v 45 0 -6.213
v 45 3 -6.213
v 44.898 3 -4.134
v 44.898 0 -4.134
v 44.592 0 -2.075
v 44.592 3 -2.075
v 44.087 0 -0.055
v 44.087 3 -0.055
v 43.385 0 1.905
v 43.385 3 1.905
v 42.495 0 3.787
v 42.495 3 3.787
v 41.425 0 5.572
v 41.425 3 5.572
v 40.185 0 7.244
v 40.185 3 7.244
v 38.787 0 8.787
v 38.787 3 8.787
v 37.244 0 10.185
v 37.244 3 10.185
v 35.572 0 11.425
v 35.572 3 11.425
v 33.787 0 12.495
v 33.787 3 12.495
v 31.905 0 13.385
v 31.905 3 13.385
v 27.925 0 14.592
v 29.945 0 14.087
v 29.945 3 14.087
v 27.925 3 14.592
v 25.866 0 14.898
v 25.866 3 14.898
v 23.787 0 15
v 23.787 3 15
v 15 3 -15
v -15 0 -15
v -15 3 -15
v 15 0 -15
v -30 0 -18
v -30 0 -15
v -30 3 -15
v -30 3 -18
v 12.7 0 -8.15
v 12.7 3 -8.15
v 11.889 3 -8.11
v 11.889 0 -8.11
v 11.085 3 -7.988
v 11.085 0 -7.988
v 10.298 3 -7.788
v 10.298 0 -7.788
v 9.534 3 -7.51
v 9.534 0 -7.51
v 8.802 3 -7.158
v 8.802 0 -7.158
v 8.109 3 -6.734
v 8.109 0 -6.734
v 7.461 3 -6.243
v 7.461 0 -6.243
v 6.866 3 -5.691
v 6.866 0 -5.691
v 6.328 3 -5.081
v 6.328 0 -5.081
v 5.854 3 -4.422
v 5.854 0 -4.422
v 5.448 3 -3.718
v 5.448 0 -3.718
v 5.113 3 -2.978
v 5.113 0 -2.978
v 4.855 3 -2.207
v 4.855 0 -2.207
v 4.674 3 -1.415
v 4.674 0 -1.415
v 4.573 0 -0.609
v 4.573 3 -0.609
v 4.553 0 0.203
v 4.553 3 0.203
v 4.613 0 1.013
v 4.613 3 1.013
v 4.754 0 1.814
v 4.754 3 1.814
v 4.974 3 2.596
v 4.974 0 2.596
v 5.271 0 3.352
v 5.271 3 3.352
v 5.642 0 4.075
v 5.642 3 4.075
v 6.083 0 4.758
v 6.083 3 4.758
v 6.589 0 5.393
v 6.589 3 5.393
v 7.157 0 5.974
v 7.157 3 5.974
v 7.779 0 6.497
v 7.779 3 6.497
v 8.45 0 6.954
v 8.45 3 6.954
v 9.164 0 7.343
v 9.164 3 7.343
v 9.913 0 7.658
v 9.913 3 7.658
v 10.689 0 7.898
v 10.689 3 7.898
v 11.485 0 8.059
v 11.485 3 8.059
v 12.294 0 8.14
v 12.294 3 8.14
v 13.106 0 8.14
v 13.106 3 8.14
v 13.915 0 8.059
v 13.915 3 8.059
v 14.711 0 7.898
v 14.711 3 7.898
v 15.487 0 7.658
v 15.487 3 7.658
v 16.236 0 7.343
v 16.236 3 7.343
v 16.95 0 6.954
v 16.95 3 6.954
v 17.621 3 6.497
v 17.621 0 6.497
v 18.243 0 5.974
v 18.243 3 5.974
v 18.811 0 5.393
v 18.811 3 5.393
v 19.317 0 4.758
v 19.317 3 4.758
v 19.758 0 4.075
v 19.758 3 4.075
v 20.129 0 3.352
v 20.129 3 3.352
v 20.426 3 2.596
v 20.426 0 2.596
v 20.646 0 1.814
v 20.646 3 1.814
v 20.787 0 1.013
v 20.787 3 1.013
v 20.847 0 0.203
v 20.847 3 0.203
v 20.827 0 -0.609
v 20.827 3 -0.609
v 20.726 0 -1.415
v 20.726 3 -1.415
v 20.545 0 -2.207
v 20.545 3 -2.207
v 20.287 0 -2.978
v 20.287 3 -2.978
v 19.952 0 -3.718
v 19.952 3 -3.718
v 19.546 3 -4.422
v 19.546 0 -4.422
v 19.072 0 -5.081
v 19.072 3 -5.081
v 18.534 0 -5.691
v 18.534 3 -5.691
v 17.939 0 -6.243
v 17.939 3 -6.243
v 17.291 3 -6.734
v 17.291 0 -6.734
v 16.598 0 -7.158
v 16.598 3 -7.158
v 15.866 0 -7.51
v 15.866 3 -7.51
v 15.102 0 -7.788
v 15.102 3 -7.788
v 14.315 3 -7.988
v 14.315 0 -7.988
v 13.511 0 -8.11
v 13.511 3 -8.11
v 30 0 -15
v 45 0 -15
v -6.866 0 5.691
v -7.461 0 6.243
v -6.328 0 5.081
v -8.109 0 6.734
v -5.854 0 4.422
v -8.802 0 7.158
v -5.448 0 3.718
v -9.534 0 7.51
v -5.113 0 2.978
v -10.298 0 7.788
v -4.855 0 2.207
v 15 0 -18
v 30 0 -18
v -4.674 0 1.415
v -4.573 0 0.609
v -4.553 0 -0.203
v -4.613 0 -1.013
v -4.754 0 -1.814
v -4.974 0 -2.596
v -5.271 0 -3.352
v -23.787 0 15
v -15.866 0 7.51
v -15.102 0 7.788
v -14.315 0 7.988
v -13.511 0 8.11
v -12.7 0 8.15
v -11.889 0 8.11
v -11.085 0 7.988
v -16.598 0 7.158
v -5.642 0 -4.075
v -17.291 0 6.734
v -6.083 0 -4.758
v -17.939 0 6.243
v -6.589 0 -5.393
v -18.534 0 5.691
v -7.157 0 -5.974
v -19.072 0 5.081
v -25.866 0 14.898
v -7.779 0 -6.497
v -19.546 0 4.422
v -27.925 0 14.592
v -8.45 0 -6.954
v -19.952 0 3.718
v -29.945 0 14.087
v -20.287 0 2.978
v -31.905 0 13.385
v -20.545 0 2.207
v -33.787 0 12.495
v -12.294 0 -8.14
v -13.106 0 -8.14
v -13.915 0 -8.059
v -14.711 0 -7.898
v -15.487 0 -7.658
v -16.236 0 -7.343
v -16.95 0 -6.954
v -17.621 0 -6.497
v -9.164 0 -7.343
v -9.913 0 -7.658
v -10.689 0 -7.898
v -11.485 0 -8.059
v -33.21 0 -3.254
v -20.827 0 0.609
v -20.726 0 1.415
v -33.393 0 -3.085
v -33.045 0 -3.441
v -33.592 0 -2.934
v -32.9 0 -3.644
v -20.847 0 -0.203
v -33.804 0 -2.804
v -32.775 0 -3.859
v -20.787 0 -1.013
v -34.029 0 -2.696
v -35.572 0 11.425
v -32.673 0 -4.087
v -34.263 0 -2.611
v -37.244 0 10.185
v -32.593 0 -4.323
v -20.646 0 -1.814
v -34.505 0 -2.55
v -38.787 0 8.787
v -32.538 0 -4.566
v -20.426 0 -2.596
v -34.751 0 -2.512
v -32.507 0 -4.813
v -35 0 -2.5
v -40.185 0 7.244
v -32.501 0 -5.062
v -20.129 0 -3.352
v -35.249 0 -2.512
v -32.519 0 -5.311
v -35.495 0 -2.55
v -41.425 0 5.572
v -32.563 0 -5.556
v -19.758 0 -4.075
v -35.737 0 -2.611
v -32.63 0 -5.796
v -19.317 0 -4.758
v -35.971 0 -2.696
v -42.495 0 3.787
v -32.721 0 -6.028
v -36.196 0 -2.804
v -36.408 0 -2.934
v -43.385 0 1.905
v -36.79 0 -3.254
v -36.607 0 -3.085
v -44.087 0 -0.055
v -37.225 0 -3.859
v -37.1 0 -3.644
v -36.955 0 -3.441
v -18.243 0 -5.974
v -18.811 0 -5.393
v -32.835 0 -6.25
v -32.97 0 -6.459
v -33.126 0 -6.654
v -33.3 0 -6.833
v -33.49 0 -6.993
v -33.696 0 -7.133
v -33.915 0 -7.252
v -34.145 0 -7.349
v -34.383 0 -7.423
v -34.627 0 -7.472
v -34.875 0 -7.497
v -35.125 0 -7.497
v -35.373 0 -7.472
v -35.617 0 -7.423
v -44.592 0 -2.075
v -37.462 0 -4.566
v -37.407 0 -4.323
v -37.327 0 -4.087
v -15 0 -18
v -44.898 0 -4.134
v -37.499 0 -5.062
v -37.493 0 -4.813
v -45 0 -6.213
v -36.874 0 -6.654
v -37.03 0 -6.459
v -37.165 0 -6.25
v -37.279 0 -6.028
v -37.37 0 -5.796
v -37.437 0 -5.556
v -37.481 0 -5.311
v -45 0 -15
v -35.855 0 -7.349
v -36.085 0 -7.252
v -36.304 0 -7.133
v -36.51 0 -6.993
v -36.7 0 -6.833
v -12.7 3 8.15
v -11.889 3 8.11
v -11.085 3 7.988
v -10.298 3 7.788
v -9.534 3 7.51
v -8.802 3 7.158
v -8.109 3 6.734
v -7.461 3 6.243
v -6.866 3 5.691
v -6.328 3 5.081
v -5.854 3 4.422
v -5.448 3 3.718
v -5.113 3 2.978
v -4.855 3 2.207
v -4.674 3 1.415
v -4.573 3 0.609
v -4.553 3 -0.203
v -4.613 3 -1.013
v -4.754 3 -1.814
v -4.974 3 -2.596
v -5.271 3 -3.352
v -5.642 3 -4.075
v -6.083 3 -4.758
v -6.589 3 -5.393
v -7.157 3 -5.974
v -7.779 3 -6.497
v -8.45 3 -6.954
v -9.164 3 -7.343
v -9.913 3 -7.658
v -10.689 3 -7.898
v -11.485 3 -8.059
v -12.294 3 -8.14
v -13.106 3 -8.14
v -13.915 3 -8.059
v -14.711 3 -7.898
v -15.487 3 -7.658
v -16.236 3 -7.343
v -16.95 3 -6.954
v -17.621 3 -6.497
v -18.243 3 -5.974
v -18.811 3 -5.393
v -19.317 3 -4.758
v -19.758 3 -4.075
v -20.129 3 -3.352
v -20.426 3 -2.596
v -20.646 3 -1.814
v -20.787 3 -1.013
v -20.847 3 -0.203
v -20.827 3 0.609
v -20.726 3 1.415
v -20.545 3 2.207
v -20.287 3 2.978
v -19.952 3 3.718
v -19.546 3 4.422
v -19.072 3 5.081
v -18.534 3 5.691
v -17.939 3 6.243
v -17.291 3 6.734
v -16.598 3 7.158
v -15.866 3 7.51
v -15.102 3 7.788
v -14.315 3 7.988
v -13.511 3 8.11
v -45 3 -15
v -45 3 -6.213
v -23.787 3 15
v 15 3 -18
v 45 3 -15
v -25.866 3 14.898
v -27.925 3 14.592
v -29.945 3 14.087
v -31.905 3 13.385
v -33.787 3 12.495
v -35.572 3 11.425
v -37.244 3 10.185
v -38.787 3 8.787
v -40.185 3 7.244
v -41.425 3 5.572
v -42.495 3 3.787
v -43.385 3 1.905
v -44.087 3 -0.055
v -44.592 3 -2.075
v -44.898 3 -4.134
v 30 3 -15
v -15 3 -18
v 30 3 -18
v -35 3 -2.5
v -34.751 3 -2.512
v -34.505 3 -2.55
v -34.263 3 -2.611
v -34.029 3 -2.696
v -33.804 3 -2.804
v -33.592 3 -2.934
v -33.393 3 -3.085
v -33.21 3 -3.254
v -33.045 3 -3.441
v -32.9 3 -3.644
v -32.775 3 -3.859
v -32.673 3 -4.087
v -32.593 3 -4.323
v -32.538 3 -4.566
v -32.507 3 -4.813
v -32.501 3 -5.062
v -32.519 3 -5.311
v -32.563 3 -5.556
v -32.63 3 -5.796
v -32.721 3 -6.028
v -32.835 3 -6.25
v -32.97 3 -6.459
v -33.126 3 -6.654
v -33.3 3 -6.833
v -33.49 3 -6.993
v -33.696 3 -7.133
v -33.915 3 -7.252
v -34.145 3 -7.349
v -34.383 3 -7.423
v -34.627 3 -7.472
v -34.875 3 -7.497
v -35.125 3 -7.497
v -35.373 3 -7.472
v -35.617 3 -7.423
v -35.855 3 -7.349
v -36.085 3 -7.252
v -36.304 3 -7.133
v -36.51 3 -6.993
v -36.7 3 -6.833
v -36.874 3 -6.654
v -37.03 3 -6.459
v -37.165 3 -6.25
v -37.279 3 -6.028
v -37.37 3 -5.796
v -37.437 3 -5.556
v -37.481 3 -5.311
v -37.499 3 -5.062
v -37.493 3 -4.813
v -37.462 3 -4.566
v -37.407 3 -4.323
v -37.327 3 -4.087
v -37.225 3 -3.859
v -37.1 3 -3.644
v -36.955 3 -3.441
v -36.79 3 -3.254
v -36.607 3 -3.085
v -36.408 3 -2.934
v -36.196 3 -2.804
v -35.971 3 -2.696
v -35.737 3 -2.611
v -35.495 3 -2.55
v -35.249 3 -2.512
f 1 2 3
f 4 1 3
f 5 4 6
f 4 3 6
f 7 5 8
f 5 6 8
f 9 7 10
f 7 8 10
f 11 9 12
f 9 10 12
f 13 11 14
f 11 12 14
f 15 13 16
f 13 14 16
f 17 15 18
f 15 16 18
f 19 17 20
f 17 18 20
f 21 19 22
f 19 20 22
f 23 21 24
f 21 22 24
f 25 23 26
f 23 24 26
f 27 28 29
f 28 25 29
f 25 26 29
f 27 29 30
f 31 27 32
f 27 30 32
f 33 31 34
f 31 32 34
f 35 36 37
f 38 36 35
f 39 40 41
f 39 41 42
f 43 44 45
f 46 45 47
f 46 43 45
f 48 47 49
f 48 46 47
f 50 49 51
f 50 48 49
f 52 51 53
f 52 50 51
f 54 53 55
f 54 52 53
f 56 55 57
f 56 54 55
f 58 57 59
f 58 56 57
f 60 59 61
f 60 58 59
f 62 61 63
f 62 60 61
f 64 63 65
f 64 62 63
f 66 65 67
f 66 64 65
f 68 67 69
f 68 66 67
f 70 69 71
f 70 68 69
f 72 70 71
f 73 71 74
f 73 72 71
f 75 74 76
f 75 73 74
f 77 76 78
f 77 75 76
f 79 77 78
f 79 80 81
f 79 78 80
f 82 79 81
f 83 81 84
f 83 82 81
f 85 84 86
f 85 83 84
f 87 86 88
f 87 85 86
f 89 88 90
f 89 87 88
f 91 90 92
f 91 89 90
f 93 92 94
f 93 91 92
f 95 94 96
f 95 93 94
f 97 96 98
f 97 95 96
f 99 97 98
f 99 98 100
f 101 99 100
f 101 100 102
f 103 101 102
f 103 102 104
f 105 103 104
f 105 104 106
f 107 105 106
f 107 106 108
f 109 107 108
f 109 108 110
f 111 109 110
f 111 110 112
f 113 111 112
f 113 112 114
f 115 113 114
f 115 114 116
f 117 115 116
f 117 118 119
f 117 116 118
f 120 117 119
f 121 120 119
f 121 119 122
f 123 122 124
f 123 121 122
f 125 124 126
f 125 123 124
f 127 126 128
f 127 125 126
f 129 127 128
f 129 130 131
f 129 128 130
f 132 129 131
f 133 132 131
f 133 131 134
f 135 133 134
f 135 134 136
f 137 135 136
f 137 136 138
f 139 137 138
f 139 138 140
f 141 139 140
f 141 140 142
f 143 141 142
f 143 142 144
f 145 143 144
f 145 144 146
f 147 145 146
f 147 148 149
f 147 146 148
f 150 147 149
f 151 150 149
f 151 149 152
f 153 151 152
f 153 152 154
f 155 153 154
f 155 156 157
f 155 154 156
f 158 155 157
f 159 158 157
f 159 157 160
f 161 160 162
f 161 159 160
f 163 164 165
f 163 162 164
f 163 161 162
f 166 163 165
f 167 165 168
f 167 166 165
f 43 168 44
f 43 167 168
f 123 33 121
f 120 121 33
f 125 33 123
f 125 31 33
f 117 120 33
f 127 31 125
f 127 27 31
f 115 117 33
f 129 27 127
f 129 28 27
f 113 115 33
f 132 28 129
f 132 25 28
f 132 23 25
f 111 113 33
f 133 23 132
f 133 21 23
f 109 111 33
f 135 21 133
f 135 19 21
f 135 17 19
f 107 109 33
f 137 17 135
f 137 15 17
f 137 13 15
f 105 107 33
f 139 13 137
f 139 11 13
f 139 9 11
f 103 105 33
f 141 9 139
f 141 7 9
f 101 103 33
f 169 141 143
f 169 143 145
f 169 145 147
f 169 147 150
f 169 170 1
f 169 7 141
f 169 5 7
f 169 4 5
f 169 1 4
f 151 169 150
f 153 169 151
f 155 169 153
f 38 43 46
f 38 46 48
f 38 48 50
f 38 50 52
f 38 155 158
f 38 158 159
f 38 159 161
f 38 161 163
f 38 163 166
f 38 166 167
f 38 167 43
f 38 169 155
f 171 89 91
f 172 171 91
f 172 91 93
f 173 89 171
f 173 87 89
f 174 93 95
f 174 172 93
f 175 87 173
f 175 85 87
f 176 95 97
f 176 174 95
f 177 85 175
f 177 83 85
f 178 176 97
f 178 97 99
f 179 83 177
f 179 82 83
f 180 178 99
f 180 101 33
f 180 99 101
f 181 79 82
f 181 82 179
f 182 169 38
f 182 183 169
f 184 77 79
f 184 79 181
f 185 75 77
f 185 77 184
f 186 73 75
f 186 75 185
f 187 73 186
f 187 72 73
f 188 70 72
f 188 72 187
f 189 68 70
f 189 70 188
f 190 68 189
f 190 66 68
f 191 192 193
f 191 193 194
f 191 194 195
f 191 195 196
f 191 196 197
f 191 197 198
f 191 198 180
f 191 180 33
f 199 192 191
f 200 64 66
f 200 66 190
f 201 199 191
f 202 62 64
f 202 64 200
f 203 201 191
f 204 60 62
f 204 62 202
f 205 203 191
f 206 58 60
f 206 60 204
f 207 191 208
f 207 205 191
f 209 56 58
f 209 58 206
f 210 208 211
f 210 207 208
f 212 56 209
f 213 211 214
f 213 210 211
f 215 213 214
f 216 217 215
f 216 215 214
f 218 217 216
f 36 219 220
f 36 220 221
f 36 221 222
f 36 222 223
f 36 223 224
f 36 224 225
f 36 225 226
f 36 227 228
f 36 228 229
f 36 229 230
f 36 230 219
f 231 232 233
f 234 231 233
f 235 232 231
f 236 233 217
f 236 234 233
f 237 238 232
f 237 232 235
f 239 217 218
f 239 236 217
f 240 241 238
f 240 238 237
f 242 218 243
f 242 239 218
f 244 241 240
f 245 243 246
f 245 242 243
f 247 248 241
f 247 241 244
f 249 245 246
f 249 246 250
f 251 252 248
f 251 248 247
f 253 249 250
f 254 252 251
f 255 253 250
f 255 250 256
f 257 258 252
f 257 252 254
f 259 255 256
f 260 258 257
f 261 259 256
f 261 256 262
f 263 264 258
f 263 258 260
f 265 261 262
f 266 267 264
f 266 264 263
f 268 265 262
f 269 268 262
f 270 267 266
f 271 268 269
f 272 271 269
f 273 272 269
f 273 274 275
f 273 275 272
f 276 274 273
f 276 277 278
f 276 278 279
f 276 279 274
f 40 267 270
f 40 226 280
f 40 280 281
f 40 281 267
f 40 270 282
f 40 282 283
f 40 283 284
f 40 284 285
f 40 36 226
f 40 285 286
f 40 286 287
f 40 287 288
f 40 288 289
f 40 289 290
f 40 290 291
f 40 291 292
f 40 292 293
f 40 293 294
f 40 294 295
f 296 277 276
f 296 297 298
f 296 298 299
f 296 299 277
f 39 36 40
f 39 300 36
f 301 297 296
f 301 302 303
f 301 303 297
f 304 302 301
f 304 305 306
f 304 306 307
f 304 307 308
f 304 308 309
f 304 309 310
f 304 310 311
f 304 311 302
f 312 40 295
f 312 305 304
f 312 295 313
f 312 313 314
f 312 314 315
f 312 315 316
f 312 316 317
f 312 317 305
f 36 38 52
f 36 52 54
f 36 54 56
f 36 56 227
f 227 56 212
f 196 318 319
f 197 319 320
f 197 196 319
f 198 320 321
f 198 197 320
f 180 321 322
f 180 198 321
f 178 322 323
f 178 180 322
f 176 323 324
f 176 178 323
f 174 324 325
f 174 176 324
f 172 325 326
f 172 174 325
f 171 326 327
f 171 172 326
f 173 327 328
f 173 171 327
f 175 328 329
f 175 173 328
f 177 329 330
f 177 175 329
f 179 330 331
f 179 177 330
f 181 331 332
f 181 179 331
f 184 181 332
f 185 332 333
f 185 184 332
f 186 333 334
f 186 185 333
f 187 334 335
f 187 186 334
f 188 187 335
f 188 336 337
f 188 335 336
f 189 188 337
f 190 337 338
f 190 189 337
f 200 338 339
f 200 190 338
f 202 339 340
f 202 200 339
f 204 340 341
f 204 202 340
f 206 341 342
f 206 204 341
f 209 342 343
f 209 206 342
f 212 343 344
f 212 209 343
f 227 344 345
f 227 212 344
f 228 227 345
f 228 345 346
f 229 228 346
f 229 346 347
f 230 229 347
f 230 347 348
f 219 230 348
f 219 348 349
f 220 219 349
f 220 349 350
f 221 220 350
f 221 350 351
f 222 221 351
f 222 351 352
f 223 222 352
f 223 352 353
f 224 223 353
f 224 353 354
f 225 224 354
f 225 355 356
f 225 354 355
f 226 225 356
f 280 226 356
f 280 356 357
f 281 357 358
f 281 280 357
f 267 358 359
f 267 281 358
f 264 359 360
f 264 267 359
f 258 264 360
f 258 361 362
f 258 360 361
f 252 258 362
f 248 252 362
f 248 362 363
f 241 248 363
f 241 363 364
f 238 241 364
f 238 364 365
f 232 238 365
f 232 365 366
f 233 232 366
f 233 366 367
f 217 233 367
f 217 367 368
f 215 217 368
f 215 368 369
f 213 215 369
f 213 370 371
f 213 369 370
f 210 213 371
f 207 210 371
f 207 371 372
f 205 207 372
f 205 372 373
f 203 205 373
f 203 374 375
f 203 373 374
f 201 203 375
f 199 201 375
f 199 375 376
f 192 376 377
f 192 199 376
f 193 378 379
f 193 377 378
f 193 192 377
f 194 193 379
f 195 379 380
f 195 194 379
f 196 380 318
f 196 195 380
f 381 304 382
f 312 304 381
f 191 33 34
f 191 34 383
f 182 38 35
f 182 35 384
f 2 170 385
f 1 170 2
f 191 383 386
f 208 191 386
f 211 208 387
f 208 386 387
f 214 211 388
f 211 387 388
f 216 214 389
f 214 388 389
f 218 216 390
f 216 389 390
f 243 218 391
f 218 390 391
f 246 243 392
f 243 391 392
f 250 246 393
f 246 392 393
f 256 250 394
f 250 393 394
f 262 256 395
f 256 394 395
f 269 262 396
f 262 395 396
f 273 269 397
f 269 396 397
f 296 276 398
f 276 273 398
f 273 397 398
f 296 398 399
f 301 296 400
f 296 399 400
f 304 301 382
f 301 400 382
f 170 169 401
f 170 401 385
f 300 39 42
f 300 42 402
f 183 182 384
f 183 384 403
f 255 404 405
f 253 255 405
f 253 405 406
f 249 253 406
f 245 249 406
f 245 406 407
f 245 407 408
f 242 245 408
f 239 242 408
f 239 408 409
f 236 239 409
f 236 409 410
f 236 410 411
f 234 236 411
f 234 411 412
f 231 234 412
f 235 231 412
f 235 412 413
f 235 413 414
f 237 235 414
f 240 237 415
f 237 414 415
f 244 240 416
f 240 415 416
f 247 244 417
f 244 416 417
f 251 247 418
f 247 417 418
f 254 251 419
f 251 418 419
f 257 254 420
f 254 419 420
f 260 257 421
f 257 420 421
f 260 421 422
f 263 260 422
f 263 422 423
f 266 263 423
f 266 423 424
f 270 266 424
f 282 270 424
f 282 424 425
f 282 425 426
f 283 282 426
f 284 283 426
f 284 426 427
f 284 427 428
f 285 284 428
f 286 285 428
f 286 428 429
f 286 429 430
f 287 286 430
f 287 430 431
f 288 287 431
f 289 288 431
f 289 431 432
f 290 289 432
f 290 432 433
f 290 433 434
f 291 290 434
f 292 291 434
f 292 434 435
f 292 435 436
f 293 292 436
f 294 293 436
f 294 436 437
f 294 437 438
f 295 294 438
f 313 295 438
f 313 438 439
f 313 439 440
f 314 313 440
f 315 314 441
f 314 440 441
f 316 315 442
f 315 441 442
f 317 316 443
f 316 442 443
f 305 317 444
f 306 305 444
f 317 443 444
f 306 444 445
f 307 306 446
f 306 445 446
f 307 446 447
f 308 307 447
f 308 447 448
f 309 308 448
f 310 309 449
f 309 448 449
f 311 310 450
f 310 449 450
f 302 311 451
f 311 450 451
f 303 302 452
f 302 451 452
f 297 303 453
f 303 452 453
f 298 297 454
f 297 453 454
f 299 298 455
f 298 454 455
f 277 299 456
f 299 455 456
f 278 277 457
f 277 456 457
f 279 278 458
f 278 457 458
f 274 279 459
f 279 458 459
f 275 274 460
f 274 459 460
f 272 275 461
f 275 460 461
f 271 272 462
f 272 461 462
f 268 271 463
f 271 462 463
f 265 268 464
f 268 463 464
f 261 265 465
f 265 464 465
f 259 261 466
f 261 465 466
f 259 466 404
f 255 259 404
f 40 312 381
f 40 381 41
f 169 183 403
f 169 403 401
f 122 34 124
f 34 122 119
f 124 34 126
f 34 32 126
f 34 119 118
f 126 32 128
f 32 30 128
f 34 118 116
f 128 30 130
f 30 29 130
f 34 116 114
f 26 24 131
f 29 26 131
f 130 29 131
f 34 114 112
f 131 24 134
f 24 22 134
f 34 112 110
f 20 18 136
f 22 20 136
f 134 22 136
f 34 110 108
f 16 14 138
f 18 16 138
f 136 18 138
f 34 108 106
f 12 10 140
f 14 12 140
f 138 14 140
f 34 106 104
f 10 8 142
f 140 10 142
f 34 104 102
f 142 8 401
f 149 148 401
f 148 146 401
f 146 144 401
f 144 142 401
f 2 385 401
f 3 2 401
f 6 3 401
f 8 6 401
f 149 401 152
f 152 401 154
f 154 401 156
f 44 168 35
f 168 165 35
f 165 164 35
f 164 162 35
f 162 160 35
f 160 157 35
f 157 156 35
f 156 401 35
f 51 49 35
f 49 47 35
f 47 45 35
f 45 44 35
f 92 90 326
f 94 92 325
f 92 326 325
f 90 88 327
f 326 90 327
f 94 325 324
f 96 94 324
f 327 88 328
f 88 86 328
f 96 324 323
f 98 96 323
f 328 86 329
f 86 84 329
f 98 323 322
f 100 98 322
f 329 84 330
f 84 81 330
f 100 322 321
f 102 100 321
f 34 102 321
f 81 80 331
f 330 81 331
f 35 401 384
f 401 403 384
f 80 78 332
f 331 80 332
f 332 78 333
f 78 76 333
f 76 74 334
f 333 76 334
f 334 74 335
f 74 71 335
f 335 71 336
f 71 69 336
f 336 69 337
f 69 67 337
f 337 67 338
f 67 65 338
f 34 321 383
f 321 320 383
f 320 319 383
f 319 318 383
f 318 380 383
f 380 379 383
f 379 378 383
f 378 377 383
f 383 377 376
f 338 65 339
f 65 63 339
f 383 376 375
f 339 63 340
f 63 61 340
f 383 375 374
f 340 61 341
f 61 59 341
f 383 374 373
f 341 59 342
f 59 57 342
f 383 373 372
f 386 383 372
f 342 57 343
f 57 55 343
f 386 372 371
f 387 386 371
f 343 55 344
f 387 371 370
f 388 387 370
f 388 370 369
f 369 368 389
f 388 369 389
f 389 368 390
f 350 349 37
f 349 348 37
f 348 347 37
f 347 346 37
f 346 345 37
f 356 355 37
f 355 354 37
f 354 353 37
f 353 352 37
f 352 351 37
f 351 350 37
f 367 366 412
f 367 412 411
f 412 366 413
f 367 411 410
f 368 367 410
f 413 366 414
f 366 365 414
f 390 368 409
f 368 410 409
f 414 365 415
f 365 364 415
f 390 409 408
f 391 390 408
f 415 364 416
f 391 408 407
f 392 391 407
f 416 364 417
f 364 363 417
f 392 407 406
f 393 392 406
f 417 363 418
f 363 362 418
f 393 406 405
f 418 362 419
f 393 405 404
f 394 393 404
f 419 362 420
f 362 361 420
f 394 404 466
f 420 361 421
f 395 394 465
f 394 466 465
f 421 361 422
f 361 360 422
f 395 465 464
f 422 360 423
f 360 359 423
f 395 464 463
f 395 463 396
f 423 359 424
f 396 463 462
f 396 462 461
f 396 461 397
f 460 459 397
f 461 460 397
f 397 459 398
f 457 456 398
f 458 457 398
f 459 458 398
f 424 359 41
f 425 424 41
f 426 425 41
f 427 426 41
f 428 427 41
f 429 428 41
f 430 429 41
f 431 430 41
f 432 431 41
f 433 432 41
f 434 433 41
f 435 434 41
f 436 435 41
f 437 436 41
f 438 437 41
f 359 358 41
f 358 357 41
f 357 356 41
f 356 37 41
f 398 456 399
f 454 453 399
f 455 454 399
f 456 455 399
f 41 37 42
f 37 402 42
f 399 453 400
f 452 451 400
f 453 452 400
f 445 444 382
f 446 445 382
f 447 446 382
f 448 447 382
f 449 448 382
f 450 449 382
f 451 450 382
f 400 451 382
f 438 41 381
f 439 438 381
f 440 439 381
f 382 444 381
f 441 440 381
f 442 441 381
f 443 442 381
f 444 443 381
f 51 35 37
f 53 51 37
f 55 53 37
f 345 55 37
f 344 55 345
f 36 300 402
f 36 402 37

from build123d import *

# Parameters (mm, degrees)
BOSS_EXTRUDE1_DEPTH = 3
SKETCH2_R           = 8.15
CUT_EXTRUDE4_DEPTH  = 49.559242169
SKETCH3_R           = 2.5
CUT_EXTRUDE5_DEPTH  = 10
CUT_EXTRUDE6_DEPTH  = 10


with BuildPart() as part:
    # Sketch1 → Boss-Extrude1 (new body)
    with BuildSketch(Plane(origin=(0, 0, 0), x_dir=(1, 0, 0), z_dir=(0, 1, 0))):
        Polygon((-45, 15), (-30, 15), (-30, 18), (-15, 18), (-15, 15), (15, 15), (15, 18), (30, 18), (30, 15), (45, 15), (45, -15), (-45, -15), align=None)
    extrude(amount=BOSS_EXTRUDE1_DEPTH)

    # Sketch2 → Cut-Extrude4 (cut, through all)
    with BuildSketch(Plane(origin=(0, 0, 0), x_dir=(1, 0, 0), z_dir=(0, 1, 0))):
        with Locations(Location((-12.7, 0, 0), (0, 0, 270))):
            Circle(SKETCH2_R)
        with Locations(Location((12.7, 0, 0), (0, 0, 90))):
            Circle(SKETCH2_R)
    extrude(amount=CUT_EXTRUDE4_DEPTH, mode=Mode.SUBTRACT)

    # Sketch3 → Cut-Extrude5 (cut)
    with BuildSketch(Plane(origin=(0, 3, 0), x_dir=(1, 0, 0), z_dir=(0, 1, 0))):
        with Locations(Location((-35, 5, 0), (0, 0, 270))):
            Circle(SKETCH3_R)
    extrude(amount=-CUT_EXTRUDE5_DEPTH, mode=Mode.SUBTRACT)

    # Sketch4 → Cut-Extrude6 (cut)
    with BuildSketch(Plane(origin=(0, 3, 0), x_dir=(1, 0, 0), z_dir=(0, 1, 0))):
        with BuildLine():
            ThreePointArc((-23.786796564, -15), (-38.786796564, -8.786796564), (-45, 6.213203436))
            Line((-45, 6.213203436), (-45, -15))
            Line((-45, -15), (-23.786796564, -15))
        make_face()
        with BuildLine():
            ThreePointArc((45, 6.213203436), (38.786796564, -8.786796564), (23.786796564, -15))
            Line((23.786796564, -15), (45, -15))
            Line((45, -15), (45, 6.213203436))
        make_face()
    extrude(amount=-CUT_EXTRUDE6_DEPTH, mode=Mode.SUBTRACT)


solid = part.part
